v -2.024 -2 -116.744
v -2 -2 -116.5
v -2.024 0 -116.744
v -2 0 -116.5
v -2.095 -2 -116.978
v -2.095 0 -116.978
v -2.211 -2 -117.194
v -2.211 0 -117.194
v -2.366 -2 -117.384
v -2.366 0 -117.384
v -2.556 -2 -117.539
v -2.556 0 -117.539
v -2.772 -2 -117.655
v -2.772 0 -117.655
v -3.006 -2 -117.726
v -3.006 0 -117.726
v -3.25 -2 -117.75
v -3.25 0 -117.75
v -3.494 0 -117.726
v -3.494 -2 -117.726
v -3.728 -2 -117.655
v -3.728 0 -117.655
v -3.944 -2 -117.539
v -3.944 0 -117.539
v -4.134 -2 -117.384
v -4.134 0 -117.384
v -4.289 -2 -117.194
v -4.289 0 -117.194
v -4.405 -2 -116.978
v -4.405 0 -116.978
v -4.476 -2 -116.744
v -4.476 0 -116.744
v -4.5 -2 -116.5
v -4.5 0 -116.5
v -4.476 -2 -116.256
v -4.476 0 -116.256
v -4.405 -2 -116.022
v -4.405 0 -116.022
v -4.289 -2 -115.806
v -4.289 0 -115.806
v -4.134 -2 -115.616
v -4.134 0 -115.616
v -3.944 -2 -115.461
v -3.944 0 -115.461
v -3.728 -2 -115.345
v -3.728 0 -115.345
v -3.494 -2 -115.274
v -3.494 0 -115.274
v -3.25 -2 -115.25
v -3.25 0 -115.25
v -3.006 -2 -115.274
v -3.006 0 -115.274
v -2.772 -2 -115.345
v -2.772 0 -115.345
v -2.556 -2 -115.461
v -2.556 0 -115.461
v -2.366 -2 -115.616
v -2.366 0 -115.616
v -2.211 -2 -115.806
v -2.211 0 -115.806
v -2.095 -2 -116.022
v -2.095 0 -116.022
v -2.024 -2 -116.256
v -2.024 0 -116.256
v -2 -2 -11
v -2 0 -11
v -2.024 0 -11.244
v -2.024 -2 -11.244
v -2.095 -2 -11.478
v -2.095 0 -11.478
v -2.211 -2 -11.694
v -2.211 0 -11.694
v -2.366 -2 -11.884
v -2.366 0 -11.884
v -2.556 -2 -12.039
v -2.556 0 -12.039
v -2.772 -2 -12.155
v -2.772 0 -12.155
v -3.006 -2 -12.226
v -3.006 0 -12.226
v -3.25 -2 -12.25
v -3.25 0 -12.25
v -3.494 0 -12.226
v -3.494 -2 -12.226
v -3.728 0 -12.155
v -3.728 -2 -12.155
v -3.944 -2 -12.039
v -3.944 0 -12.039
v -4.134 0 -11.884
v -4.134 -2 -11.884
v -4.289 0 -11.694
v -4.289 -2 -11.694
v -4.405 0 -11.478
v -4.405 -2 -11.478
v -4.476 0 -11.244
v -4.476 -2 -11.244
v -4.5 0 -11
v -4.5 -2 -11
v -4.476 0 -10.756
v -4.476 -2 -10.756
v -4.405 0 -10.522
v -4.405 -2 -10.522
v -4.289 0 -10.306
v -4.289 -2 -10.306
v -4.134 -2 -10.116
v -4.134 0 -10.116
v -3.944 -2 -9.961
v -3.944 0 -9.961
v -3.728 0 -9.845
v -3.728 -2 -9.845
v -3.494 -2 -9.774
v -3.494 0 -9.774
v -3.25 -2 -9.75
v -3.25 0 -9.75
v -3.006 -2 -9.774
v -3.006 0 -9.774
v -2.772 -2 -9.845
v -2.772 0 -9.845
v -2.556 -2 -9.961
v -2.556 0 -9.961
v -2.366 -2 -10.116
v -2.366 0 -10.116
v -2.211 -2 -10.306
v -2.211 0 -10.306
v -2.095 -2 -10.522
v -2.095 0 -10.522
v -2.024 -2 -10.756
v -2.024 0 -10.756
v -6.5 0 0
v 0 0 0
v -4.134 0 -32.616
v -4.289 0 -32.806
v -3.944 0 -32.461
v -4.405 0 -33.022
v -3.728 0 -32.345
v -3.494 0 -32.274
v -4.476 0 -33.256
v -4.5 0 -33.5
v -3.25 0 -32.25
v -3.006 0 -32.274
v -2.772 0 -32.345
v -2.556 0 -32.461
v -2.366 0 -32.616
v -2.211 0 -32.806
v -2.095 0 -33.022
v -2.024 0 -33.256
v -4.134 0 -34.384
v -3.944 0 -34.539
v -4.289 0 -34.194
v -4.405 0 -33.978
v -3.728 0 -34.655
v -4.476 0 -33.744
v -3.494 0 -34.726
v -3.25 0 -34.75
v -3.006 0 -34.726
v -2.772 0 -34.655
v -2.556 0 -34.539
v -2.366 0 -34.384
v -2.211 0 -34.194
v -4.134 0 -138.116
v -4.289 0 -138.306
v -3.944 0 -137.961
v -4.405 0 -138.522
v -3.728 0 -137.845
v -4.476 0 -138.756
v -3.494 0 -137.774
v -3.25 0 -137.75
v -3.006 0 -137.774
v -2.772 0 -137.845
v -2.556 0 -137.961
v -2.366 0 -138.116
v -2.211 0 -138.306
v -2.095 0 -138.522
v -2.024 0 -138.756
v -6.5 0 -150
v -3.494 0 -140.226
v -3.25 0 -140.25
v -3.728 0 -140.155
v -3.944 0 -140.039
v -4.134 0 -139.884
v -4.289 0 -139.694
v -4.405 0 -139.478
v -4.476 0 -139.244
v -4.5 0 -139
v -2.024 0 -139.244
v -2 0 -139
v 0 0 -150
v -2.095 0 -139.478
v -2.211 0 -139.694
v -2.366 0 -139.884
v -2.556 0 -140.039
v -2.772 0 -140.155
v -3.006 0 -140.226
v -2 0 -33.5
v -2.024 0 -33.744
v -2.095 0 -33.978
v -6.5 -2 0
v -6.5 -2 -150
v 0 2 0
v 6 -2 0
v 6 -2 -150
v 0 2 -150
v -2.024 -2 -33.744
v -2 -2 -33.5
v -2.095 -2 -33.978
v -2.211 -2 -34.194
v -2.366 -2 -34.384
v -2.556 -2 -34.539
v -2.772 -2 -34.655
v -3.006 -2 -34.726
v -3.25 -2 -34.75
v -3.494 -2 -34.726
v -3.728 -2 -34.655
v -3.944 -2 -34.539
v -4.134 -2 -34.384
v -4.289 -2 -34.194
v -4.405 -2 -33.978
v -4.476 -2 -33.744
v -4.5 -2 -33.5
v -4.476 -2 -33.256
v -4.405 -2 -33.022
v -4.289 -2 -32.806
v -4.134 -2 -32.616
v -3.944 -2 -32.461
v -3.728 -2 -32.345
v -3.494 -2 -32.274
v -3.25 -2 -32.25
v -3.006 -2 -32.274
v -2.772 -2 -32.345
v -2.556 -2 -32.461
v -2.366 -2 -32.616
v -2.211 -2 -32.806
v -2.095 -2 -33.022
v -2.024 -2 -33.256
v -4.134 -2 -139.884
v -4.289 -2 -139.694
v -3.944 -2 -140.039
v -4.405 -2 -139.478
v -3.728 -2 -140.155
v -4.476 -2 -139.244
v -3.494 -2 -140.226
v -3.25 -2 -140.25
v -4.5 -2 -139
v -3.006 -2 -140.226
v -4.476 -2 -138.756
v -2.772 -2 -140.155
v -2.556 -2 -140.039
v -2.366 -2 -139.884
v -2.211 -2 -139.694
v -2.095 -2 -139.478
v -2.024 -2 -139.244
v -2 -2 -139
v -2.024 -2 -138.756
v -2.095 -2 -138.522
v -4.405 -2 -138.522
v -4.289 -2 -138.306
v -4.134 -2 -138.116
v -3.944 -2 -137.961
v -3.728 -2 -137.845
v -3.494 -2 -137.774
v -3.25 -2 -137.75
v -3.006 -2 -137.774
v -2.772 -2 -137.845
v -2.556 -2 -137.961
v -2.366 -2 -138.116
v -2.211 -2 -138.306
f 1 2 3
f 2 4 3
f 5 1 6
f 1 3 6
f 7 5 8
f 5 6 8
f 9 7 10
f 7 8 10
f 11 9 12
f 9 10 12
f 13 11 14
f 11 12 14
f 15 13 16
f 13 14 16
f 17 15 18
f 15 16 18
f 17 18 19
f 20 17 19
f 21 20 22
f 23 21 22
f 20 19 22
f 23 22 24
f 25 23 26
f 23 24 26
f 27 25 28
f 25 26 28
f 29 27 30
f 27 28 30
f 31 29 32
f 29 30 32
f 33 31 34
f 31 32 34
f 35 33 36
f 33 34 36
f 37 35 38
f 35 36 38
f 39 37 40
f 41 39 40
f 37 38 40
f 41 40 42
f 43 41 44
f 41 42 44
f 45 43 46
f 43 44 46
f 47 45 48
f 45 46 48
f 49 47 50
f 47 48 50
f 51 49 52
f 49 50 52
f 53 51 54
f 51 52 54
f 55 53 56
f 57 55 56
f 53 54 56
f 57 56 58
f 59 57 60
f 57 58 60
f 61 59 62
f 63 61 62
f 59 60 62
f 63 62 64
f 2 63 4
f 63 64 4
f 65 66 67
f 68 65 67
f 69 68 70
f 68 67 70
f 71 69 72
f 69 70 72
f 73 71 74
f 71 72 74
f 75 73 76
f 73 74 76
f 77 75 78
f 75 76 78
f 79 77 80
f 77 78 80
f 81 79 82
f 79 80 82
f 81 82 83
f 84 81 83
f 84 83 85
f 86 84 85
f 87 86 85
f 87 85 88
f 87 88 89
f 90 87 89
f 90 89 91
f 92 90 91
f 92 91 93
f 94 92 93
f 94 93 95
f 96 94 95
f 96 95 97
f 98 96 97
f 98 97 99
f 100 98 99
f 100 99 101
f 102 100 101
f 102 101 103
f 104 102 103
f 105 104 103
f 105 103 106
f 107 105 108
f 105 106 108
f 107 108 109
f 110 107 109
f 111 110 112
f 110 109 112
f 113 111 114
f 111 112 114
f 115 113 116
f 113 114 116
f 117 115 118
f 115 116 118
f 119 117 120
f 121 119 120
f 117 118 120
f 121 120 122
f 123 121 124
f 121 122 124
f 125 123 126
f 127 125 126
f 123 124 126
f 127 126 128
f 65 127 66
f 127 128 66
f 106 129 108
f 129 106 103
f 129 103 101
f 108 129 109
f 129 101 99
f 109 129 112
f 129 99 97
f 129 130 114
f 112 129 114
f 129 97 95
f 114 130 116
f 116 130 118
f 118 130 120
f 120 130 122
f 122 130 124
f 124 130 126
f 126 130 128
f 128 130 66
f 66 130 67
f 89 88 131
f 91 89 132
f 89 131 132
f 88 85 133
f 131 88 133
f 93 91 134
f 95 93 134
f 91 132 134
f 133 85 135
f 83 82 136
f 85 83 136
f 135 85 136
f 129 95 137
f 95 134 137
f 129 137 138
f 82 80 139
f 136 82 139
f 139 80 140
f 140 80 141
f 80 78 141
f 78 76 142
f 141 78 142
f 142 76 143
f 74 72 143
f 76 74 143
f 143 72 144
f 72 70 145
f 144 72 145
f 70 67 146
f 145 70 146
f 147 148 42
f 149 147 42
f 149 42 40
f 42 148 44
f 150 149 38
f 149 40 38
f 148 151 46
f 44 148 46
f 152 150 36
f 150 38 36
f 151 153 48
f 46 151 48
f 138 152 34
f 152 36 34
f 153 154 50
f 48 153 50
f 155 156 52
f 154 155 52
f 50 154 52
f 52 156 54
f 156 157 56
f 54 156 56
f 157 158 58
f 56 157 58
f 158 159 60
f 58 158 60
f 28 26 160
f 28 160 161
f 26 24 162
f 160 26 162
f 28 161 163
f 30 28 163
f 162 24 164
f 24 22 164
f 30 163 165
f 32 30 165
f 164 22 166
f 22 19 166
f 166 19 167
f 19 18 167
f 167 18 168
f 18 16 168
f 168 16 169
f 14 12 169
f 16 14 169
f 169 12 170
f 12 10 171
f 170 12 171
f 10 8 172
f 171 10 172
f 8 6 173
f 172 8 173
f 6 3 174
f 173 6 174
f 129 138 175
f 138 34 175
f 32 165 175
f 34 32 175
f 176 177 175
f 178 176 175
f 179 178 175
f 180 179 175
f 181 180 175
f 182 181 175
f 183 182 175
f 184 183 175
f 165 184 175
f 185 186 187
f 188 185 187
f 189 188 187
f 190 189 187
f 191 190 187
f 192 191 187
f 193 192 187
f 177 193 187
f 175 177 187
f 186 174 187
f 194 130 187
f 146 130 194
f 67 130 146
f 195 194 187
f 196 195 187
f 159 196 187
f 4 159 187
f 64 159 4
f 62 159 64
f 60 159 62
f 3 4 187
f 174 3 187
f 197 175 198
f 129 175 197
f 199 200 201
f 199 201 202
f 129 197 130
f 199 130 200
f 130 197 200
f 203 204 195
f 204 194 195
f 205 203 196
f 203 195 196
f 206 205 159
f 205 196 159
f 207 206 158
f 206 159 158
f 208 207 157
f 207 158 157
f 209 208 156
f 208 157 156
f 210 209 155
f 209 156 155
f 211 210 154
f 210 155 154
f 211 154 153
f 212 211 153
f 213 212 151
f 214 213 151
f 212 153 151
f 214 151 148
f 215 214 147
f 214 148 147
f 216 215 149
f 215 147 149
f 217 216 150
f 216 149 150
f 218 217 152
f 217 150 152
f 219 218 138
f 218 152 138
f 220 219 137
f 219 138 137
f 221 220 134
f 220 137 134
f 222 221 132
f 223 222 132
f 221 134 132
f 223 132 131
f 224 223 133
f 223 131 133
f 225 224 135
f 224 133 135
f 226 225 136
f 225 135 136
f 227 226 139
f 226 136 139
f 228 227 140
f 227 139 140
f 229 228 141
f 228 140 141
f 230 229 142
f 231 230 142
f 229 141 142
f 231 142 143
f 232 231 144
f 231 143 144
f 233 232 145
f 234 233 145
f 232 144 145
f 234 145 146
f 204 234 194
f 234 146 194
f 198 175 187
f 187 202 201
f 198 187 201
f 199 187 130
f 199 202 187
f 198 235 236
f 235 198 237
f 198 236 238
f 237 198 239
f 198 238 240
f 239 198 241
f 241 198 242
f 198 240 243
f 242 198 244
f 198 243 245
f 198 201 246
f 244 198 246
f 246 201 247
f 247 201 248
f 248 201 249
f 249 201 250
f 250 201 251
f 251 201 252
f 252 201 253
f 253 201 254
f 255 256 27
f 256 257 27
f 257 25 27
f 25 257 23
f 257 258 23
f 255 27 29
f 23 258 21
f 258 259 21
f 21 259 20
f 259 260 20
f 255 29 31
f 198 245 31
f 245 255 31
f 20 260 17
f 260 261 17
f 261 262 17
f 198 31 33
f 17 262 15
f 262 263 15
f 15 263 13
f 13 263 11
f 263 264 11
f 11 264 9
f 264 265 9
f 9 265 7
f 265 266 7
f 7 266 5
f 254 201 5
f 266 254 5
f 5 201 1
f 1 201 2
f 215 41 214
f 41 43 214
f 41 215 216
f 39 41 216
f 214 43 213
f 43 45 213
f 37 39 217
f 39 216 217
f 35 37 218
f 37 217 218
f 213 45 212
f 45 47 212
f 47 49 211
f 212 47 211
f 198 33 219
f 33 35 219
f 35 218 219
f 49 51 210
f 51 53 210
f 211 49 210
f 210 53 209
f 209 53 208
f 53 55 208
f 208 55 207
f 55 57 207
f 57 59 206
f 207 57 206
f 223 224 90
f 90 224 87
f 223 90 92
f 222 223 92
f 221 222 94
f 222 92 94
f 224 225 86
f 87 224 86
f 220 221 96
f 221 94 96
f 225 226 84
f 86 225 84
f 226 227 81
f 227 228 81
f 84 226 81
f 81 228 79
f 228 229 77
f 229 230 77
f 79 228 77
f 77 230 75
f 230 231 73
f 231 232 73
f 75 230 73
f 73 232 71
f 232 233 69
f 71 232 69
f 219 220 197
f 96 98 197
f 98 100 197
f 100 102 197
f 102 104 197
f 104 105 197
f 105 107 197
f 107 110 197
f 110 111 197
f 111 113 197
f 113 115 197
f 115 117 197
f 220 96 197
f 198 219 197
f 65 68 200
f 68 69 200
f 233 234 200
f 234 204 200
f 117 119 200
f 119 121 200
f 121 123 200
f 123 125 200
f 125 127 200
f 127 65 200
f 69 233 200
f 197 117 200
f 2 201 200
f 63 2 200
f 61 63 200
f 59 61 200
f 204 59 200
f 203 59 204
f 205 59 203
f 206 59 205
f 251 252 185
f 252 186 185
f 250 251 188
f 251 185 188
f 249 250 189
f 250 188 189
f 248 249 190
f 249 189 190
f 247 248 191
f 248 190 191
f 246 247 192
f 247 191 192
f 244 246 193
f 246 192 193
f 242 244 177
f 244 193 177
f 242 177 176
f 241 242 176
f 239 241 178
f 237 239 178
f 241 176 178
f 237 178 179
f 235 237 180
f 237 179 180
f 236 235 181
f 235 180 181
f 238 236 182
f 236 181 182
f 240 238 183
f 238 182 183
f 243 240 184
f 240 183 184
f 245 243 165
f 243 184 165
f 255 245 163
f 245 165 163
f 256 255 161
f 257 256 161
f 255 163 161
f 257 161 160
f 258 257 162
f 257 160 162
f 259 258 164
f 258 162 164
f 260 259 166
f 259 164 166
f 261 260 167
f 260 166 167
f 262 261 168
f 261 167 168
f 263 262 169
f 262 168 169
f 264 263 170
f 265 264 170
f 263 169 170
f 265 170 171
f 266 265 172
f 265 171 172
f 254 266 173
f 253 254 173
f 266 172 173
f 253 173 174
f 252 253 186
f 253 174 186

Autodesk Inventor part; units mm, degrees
ref_plane "YZ Plane" through (0, 0, 0) normal (1, 0, 0) x (0, 1, 0)
ref_plane "XZ Plane" through (0, 0, 0) normal (0, 1, 0) x (-1, 0, 0)
ref_plane "XY Plane" through (0, 0, 0) normal (0, 0, 1) x (1, 0, 0)
sketch "Szkic1" plane through (0, 0, 0) normal (0, 1, 0) x (-1, 0, 0)
  line L0 (0, 0) -> (6.5, 0)
  line L1 (6.5, 0) -> (6.5, -150)
  line L2 (6.5, -150) -> (0, -150)
  line L3 (0, -150) -> (0, 0)
  dimension "d0" = 6.5
  dimension "d1" = 150
extrude "Wyciągnięcie proste1" add sketch "Szkic1" along normal blind 2
sketch "Szkic8" plane through (-6.5, 0, 0) normal (0, 0, 1) x (1, 0, 0)
  line L0 (6.5, 2) -> (0, 2) projected
  line L1 (6.5, 2) -> (12.5, 2)
  line L2 (12.5, 2) -> (12.5, -2)
  line L3 (12.5, -2) -> (6.5, -2)
  line L4 (6.5, -2) -> (6.5, 2)
  line L5 (12.5, -2) -> (6.5, 2)
  point P0 (6.5, 0)
  dimension "d34" = 6
  dimension "d35" = 4
extrude "Wyciągnięcie proste6" add sketch "Szkic8" against normal blind 150 contours L5 L3 L4
sketch "Szkic9" plane through (0, 0, -150) normal (-1, 0, 0) x (0, 0, 1)
  line L0 (0, 2) -> (0, -2) projected
  line L1 (0, -2) -> (150, -2)
  line L2 (150, -2) -> (150, 0)
  line L3 (150, 0) -> (0, 0)
  line L4 (0, 0) -> (0, -2)
  line L5 (0, 2) -> (150, 2) projected
  line L6 (150, 0) -> (0, 0)
  line L7 (0, 0) -> (0, 2)
  line L8 (0, 2) -> (150, 2)
  line L9 (150, 2) -> (150, 0)
extrude "Wyciągnięcie proste7" cut sketch "Szkic9" along normal blind 10 contours L5 L9 L3 L0
extrude "Wyciągnięcie proste8" add sketch "Szkic9" along normal blind 6.5 contours L3 L2 L1 L0
sketch "Szkic10" plane through (0, 0, 0) normal (0, 1, 0) x (1, 0, 0)
  circle A0 centre (-3.25, 11) radius 1.25
  line L0 (0, 0) -> (-6.5, 0) projected
  line L1 (-6.5, 0) -> (-6.5, 150) projected
  circle A1 centre (-3.25, 33.5) radius 1.25
  circle A2 centre (-3.25, 116.5) radius 1.25
  circle A3 centre (-3.25, 139) radius 1.25
  line L2 (0, 150) -> (-6.5, 150) projected
  point P0 (-3.25, 0)
  point P1 (-3.25, 150)
  dimension "d42" = 2.5
  dimension "d43" = 11
  dimension "d44" = 3.25
  dimension "d45" = 2.5
  dimension "d46" = 3.25
  dimension "d47" = 33.5
  dimension "d49" = 2.5
  dimension "d50" = 2.5
  dimension "d53" = 11
  dimension "d54" = 33.5
  dimension "d55" = 3.25
  dimension "d56" = 3.25
extrude "Wyciągnięcie proste9" cut sketch "Szkic10" against normal blind 2
thread "Gwint5" size "M3x0.5" class "6H" standard "ANSI Metric M Profile" full length
thread "Gwint6" size "M3x0.5" class "6H" standard "ANSI Metric M Profile" full length
thread "Gwint8" size "M3x0.5" class "6H" standard "ANSI Metric M Profile" full length
thread "Gwint9" size "M3x0.5" class "6H" standard "ANSI Metric M Profile" full length
properties part number "pługmoj" material "Stal, miękka"
